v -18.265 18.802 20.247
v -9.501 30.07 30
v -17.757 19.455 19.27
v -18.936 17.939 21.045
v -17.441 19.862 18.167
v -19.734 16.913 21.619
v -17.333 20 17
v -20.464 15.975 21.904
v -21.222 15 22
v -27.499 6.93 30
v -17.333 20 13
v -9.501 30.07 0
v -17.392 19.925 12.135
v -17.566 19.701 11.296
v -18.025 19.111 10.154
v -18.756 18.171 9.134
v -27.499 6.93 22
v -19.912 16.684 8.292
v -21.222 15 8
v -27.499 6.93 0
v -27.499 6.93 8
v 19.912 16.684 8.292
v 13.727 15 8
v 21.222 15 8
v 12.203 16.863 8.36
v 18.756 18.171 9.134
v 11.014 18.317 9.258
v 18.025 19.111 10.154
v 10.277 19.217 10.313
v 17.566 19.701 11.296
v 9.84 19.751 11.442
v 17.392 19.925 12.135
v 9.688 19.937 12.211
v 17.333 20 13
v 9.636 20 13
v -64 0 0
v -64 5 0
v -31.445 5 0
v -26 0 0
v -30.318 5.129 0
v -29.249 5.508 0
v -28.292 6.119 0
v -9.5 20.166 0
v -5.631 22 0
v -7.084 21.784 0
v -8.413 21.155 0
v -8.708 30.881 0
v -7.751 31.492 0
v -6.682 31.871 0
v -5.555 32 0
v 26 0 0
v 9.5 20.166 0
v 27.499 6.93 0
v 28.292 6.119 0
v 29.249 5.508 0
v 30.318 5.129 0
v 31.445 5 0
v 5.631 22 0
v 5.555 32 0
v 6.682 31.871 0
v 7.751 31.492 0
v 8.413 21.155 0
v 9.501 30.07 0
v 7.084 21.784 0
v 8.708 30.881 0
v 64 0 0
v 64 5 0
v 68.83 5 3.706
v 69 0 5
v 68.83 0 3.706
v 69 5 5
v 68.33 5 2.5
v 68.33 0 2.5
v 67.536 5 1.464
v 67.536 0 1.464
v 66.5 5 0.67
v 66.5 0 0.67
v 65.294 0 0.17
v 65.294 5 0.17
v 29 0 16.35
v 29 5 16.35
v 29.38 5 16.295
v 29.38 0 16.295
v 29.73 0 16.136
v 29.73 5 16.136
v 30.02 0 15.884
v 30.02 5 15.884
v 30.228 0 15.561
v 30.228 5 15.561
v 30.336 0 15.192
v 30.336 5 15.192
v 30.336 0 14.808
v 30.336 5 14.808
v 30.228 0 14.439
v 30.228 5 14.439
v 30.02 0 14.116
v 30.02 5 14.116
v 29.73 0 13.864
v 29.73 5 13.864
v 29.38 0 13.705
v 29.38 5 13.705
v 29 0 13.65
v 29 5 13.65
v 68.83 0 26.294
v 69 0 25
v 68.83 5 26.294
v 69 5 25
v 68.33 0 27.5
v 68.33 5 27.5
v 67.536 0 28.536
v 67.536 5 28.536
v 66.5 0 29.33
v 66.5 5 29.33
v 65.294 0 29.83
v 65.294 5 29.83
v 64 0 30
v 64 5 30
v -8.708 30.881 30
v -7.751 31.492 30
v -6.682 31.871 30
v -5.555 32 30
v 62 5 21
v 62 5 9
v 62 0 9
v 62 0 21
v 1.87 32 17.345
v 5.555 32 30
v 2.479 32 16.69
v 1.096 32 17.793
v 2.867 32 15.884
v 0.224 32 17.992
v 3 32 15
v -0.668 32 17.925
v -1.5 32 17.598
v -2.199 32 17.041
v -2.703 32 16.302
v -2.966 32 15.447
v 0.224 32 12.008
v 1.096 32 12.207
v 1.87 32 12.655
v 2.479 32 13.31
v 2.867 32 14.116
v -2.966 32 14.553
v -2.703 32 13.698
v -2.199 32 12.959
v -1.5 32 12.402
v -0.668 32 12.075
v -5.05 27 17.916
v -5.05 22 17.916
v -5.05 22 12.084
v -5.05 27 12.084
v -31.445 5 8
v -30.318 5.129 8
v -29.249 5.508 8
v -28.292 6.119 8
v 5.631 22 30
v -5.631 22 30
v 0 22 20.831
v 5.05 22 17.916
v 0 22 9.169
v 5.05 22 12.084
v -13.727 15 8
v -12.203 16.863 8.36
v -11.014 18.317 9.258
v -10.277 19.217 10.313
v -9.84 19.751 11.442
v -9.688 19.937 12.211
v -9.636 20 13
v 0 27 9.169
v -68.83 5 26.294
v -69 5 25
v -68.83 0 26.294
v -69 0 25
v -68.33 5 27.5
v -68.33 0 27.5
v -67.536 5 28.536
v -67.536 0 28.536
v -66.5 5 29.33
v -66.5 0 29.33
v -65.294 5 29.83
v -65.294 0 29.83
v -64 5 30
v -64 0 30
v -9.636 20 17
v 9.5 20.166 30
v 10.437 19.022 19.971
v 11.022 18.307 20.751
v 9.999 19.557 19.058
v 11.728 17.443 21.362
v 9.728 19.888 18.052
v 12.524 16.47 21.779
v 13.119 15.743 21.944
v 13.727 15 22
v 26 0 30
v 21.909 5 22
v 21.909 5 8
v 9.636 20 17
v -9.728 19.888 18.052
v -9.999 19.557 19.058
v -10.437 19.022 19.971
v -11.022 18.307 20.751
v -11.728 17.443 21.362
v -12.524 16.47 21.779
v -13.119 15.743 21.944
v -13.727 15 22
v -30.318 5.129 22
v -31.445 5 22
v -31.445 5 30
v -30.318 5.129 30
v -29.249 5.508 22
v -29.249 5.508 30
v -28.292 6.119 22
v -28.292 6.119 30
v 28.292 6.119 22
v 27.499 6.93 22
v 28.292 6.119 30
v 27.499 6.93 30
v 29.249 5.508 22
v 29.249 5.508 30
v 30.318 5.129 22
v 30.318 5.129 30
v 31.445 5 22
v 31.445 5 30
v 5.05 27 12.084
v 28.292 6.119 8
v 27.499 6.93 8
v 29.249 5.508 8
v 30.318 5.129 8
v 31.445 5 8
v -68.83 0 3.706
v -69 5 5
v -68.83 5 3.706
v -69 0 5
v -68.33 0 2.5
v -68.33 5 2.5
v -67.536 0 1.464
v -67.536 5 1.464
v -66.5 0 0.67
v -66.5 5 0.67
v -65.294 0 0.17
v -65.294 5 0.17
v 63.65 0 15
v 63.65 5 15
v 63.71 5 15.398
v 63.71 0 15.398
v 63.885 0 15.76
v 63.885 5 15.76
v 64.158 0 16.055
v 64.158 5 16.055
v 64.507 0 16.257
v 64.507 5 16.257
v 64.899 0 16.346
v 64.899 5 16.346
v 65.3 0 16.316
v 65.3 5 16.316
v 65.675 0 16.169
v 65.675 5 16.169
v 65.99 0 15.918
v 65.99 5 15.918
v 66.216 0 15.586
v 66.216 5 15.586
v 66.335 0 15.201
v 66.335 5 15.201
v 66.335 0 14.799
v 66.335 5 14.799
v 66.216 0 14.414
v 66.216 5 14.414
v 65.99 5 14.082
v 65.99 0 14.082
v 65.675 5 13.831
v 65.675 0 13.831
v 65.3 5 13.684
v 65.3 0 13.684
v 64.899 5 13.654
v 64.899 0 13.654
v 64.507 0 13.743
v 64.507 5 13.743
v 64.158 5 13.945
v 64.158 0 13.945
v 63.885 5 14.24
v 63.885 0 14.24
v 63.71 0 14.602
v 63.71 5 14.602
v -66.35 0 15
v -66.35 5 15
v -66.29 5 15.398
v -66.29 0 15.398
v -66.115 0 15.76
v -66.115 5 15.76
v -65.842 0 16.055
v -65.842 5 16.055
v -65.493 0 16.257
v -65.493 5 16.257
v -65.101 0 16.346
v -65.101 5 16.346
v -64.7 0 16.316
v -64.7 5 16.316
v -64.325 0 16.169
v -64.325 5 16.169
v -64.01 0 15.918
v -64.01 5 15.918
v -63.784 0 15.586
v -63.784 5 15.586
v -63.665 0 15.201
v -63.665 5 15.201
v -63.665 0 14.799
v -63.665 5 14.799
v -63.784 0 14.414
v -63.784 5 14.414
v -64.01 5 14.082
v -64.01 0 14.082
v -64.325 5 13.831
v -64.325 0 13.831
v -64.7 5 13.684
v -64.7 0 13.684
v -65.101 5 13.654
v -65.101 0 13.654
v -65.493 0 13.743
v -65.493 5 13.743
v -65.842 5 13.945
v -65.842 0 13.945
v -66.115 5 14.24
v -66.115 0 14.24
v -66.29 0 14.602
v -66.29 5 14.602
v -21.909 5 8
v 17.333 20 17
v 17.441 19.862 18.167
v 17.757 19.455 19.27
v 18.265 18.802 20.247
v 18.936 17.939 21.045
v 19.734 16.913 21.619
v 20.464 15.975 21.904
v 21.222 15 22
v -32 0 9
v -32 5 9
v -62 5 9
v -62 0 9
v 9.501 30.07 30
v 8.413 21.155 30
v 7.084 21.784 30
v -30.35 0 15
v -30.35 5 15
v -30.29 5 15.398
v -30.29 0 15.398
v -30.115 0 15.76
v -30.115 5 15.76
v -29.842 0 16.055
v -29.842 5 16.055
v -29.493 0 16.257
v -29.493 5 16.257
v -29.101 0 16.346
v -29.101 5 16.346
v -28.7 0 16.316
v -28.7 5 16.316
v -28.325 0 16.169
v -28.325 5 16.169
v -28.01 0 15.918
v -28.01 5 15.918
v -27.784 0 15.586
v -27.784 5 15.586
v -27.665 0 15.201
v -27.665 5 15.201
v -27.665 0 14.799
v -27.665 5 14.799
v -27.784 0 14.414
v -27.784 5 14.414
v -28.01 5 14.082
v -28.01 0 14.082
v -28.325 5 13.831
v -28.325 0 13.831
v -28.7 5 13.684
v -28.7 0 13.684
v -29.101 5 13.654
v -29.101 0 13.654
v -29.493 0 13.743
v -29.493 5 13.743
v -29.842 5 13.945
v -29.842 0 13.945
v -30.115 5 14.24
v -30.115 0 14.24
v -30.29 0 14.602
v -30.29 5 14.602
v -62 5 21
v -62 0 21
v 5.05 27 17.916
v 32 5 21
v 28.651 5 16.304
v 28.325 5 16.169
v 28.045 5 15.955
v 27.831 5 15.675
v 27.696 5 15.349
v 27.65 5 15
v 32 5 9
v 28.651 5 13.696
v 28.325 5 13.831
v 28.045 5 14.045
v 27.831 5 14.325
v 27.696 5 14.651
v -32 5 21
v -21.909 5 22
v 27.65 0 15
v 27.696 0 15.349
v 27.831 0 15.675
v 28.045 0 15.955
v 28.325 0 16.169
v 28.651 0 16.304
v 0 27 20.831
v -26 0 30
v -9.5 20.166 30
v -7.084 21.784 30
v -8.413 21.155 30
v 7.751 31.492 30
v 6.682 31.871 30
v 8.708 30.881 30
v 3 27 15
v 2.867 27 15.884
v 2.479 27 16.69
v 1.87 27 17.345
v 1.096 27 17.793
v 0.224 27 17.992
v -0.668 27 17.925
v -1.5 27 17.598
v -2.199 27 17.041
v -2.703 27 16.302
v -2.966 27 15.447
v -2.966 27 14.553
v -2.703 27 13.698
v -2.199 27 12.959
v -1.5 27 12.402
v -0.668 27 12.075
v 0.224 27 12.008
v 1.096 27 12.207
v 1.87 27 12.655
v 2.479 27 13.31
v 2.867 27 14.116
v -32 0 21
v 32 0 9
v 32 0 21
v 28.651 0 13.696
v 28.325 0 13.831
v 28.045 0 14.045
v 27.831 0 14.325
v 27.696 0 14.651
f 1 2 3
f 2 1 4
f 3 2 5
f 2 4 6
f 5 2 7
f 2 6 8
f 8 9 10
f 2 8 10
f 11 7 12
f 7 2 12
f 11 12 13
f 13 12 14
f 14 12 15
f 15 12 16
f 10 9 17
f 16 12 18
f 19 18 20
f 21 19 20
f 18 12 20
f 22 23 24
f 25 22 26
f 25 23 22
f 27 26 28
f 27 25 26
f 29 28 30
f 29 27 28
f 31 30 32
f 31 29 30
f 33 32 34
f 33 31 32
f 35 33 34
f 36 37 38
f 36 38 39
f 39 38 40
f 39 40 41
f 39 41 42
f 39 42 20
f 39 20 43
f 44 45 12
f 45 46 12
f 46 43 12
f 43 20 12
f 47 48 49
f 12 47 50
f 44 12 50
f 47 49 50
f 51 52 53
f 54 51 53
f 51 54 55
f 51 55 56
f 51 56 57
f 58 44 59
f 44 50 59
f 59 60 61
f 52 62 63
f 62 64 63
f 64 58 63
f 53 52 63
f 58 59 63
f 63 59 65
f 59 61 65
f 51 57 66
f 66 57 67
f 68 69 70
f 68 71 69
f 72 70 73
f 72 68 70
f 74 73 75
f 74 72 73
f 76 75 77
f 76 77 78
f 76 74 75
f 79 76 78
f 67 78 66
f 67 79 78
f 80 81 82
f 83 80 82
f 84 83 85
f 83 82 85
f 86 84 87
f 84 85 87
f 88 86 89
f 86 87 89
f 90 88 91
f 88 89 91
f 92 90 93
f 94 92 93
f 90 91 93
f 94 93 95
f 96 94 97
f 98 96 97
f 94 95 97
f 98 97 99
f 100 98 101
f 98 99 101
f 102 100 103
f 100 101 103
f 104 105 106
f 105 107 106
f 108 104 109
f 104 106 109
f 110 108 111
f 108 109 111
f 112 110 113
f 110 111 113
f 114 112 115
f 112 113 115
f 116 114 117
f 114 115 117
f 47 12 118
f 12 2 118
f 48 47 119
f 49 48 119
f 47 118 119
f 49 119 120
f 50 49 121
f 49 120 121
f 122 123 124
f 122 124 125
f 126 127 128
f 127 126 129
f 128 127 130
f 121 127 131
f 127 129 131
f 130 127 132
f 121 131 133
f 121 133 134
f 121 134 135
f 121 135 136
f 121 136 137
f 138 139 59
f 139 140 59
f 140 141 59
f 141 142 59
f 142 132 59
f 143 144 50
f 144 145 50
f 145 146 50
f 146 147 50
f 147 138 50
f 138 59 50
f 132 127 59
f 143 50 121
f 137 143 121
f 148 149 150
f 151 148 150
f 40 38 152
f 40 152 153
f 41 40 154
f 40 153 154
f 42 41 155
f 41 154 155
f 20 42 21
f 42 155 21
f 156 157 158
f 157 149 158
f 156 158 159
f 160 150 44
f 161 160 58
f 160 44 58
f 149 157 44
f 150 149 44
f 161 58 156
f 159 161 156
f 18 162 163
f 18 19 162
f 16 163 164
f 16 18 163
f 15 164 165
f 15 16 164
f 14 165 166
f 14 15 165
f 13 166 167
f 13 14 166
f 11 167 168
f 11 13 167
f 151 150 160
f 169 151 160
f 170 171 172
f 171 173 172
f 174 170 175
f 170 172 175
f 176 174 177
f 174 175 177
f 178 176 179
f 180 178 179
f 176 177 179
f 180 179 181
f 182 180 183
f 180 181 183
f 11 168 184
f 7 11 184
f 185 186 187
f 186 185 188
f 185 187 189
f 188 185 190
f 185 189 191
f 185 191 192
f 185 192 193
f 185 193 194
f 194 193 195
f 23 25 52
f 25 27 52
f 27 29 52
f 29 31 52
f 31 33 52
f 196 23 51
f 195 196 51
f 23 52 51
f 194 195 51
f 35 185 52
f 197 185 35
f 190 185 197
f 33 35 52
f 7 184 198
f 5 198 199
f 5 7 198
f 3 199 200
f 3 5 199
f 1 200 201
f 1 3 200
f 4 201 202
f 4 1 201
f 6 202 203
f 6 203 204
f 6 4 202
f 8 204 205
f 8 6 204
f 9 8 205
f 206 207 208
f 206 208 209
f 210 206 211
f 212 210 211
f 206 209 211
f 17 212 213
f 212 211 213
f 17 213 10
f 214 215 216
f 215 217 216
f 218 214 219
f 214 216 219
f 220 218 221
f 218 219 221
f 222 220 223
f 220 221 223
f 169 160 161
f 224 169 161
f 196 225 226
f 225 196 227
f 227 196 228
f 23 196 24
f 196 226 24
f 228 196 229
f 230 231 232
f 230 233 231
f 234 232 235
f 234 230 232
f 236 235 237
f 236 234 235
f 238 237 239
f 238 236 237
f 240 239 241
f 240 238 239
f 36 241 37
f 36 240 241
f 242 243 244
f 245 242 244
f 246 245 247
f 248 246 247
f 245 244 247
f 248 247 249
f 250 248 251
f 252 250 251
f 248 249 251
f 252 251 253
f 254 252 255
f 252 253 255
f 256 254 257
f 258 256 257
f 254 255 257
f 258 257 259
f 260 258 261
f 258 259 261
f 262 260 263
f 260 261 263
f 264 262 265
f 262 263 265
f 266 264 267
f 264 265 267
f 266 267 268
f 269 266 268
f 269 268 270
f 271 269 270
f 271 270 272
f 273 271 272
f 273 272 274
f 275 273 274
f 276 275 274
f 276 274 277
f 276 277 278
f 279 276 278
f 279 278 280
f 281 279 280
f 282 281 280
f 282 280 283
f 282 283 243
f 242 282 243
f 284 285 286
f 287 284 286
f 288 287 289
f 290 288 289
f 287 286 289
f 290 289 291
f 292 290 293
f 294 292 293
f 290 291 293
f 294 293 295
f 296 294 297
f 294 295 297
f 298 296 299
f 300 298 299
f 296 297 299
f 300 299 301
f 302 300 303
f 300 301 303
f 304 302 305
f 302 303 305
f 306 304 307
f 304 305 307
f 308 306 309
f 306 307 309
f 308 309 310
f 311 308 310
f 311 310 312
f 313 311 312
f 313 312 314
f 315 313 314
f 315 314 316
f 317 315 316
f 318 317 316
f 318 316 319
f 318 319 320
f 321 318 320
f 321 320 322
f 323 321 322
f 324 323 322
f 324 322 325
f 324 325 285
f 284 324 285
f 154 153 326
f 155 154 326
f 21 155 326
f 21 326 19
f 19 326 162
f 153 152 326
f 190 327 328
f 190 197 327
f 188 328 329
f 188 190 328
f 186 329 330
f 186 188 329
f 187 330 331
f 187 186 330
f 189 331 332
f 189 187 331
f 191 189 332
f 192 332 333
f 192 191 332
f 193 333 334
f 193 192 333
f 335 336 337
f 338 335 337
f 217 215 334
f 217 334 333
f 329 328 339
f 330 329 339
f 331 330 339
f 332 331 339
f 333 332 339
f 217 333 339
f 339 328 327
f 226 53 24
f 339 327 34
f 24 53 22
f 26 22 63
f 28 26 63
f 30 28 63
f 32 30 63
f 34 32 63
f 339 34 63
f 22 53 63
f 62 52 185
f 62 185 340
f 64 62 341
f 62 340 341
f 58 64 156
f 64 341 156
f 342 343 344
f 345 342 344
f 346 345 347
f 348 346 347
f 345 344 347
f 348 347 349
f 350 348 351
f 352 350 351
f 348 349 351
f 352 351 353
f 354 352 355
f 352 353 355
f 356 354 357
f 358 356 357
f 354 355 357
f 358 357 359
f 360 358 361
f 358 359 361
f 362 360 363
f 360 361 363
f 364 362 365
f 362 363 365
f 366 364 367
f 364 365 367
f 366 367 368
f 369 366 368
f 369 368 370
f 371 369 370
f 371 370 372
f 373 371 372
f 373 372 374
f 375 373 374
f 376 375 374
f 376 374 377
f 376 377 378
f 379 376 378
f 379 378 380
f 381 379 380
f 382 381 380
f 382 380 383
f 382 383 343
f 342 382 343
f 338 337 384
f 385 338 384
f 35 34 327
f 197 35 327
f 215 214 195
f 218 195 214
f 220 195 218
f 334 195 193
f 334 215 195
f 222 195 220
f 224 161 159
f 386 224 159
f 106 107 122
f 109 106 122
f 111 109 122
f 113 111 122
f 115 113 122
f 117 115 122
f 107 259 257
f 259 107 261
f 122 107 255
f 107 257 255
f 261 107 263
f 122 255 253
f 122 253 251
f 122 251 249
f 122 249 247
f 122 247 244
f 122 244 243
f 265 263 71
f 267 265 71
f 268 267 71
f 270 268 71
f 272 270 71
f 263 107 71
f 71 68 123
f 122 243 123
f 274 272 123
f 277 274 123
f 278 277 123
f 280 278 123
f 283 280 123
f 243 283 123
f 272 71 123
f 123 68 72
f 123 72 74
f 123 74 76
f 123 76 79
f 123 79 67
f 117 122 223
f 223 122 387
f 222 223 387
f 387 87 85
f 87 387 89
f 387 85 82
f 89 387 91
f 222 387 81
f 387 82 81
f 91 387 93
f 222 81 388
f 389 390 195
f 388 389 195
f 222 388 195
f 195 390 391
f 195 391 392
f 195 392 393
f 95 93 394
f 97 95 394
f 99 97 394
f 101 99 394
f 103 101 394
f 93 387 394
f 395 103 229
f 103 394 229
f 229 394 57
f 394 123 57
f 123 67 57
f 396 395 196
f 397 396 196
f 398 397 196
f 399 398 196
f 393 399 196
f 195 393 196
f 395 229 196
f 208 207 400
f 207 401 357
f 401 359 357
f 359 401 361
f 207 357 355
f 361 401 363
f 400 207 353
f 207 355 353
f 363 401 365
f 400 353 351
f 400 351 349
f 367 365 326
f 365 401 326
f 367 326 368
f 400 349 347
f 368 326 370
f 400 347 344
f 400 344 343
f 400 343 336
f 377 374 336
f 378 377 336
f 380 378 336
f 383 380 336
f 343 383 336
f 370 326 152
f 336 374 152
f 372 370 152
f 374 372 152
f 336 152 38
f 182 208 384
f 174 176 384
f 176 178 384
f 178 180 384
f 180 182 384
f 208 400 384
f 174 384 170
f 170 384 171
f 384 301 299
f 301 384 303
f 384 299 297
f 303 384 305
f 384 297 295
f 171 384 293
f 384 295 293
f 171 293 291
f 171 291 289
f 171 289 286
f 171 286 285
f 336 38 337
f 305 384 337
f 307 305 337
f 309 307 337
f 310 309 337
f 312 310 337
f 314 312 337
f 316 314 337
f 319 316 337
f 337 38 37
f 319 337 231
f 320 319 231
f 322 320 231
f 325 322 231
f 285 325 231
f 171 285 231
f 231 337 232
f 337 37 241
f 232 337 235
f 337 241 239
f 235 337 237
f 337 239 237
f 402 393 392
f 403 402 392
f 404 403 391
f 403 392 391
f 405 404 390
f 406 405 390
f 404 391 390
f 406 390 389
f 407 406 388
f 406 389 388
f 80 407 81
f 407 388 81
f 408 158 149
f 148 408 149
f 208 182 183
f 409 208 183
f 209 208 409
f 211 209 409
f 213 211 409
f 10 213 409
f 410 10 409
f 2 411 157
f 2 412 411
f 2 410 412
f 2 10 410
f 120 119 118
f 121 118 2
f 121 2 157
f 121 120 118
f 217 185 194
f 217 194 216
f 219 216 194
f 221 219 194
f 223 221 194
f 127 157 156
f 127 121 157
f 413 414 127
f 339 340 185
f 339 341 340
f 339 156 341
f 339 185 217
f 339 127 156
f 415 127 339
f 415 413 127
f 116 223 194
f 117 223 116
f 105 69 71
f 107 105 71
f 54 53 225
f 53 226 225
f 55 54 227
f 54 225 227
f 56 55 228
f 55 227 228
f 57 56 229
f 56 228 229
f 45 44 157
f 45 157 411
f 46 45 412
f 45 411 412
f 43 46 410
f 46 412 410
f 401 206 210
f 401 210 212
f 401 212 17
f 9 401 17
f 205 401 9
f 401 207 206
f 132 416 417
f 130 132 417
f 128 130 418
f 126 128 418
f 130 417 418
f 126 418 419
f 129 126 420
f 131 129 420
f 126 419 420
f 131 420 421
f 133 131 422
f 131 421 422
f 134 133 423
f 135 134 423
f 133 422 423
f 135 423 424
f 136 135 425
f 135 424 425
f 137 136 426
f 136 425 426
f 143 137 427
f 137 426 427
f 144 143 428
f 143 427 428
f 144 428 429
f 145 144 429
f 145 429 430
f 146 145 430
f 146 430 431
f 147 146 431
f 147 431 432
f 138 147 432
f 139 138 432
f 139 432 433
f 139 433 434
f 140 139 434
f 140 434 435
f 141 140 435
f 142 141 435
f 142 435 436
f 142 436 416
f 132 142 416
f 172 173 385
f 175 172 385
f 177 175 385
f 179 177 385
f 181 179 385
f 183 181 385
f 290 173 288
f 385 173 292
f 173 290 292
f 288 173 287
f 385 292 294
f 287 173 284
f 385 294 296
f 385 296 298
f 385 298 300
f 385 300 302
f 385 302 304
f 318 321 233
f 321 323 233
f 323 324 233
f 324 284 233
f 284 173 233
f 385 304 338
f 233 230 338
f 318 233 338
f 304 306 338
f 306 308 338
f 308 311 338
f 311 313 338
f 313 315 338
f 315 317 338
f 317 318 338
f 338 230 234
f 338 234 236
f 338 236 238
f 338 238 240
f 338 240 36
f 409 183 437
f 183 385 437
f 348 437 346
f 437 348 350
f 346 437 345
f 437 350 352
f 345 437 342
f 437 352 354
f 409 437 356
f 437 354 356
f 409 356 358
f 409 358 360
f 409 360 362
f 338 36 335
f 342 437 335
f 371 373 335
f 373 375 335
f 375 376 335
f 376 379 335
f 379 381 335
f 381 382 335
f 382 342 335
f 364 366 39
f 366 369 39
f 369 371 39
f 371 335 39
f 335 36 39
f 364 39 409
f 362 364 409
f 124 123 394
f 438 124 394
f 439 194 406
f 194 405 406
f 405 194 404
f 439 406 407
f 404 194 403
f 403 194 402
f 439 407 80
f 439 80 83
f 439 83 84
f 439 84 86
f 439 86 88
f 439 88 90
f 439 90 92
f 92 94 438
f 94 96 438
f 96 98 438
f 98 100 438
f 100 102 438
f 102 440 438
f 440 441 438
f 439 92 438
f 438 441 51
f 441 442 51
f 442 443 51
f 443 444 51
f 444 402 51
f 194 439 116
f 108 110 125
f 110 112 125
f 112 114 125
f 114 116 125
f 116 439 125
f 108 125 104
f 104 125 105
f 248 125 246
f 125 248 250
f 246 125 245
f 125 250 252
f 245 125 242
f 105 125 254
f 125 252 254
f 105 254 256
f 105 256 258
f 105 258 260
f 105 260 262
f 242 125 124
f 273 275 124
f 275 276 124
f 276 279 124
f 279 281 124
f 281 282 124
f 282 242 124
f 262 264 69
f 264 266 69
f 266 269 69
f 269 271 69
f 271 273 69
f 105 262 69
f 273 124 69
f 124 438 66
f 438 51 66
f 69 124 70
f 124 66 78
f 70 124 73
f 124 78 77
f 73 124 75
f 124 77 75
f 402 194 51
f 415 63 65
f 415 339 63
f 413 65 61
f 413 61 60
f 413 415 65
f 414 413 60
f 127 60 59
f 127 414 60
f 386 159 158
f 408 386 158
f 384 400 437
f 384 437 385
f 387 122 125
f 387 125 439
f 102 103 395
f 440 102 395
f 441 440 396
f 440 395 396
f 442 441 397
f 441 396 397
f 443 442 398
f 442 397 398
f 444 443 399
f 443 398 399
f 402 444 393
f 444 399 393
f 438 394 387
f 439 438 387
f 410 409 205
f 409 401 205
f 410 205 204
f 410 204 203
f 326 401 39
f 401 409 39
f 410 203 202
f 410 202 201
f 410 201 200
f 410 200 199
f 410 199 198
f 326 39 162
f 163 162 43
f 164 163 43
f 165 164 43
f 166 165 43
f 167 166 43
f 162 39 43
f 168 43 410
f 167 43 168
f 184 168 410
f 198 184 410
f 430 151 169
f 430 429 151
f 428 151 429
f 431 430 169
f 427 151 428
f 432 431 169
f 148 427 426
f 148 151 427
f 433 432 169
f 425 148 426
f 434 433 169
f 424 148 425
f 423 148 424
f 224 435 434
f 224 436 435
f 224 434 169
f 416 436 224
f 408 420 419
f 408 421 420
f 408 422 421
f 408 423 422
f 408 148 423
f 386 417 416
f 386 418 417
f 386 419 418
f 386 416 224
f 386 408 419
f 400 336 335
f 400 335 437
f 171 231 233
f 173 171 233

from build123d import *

# Parameters (mm, degrees)
F1_DEPTH = 30
F3_R     = 3
F4_DEPTH = 25
F5_DEPTH = 5
F6_W     = 15
F6_H     = 14
F7_DEPTH = 160
F8_R     = 5
F2_W     = 30
F2_H     = 12
F2_R     = 1.35
F9_DEPTH = 25


# Not quite as in the source:
# - a feature names something its author has since deleted; it is built from what else it names


with BuildPart() as f1:
    # F0 (on Top) → F1 (new body)
    with BuildSketch(Plane.XY):
        Polygon((29, 5), (8, 32), (-8, 32), (-29, 5), (-69, 5), (-69, 0), (-26, 0), (-8, 22), (8, 22), (26, 0), (69, 0), (69, 5), align=None)
    extrude(amount=F1_DEPTH)

    # F3 (on face) → F4 (cut)
    with BuildSketch(Plane.XZ.offset(-22)):
        with Locations((0, 15)):
            Circle(F3_R)
    extrude(amount=-F4_DEPTH, mode=Mode.SUBTRACT)

    # F3 (on face) → F5 (cut)
    with BuildSketch(Plane.XZ.offset(-22)):
        Polygon((0, 9.1687622812), (5.05, 12.0843811406), (5.05, 17.9156188594), (0, 20.8312377188), (-5.05, 17.9156188594), (-5.05, 12.0843811406), align=None)
        with Locations((0, 15)):
            Circle(F3_R, mode=Mode.SUBTRACT)
    extrude(amount=-F5_DEPTH, mode=Mode.SUBTRACT)

    # F6 (on face) → F7 (cut)
    with BuildSketch(Plane.YZ.offset(69)):
        with Locations((12.5, 15)):
            Rectangle(F6_W, F6_H)
    extrude(amount=-F7_DEPTH, mode=Mode.SUBTRACT)

    # F8
    f8_edges = [f1.edges().sort_by_distance(p)[0] for p in [
        (-8, 32, 15),
        (8, 32, 15),
        (-8, 22, 15),
        (8, 22, 15),
        (29, 5, 26),
        (29, 5, 4),
        (13.484848, 20, 8),
        (13.484848, 20, 22),
        (-13.484848, 20, 8),
        (-13.484848, 20, 22),
        (-29, 5, 4),
        (-29, 5, 26),
        (-69, 2.5, 30),
        (-69, 2.5, 0),
        (69, 2.5, 30),
        (69, 2.5, 0),
    ]]
    fillet(f8_edges, radius=F8_R)

    # F2 (on face) → F9 (cut)
    with BuildSketch(Plane(origin=(0, 5, 0), x_dir=(-1, 0, 0), z_dir=(0, 1, 0))):
        with Locations((47, 15)):
            Rectangle(F2_W, F2_H)
        with Locations((-47, 15)):
            Rectangle(F2_W, F2_H)
        with BuildLine():
            Line((-29, 13.65), (-29, 16.35))
            ThreePointArc((-29, 16.35), (-30.35, 15), (-29, 13.65))
        make_face()
        with BuildLine():
            ThreePointArc((-29, 13.65), (-28.0454058454, 14.0454058454), (-27.65, 15))
            ThreePointArc((-27.65, 15), (-28.0454058454, 15.9545941546), (-29, 16.35))
            Line((-29, 16.35), (-29, 13.65))
        make_face()
        with Locations((-65, 15)):
            Circle(F2_R)
        with Locations((29, 15)):
            Circle(F2_R)
        with Locations((65, 15)):
            Circle(F2_R)
    extrude(amount=-F9_DEPTH, mode=Mode.SUBTRACT)


solid = f1.part
